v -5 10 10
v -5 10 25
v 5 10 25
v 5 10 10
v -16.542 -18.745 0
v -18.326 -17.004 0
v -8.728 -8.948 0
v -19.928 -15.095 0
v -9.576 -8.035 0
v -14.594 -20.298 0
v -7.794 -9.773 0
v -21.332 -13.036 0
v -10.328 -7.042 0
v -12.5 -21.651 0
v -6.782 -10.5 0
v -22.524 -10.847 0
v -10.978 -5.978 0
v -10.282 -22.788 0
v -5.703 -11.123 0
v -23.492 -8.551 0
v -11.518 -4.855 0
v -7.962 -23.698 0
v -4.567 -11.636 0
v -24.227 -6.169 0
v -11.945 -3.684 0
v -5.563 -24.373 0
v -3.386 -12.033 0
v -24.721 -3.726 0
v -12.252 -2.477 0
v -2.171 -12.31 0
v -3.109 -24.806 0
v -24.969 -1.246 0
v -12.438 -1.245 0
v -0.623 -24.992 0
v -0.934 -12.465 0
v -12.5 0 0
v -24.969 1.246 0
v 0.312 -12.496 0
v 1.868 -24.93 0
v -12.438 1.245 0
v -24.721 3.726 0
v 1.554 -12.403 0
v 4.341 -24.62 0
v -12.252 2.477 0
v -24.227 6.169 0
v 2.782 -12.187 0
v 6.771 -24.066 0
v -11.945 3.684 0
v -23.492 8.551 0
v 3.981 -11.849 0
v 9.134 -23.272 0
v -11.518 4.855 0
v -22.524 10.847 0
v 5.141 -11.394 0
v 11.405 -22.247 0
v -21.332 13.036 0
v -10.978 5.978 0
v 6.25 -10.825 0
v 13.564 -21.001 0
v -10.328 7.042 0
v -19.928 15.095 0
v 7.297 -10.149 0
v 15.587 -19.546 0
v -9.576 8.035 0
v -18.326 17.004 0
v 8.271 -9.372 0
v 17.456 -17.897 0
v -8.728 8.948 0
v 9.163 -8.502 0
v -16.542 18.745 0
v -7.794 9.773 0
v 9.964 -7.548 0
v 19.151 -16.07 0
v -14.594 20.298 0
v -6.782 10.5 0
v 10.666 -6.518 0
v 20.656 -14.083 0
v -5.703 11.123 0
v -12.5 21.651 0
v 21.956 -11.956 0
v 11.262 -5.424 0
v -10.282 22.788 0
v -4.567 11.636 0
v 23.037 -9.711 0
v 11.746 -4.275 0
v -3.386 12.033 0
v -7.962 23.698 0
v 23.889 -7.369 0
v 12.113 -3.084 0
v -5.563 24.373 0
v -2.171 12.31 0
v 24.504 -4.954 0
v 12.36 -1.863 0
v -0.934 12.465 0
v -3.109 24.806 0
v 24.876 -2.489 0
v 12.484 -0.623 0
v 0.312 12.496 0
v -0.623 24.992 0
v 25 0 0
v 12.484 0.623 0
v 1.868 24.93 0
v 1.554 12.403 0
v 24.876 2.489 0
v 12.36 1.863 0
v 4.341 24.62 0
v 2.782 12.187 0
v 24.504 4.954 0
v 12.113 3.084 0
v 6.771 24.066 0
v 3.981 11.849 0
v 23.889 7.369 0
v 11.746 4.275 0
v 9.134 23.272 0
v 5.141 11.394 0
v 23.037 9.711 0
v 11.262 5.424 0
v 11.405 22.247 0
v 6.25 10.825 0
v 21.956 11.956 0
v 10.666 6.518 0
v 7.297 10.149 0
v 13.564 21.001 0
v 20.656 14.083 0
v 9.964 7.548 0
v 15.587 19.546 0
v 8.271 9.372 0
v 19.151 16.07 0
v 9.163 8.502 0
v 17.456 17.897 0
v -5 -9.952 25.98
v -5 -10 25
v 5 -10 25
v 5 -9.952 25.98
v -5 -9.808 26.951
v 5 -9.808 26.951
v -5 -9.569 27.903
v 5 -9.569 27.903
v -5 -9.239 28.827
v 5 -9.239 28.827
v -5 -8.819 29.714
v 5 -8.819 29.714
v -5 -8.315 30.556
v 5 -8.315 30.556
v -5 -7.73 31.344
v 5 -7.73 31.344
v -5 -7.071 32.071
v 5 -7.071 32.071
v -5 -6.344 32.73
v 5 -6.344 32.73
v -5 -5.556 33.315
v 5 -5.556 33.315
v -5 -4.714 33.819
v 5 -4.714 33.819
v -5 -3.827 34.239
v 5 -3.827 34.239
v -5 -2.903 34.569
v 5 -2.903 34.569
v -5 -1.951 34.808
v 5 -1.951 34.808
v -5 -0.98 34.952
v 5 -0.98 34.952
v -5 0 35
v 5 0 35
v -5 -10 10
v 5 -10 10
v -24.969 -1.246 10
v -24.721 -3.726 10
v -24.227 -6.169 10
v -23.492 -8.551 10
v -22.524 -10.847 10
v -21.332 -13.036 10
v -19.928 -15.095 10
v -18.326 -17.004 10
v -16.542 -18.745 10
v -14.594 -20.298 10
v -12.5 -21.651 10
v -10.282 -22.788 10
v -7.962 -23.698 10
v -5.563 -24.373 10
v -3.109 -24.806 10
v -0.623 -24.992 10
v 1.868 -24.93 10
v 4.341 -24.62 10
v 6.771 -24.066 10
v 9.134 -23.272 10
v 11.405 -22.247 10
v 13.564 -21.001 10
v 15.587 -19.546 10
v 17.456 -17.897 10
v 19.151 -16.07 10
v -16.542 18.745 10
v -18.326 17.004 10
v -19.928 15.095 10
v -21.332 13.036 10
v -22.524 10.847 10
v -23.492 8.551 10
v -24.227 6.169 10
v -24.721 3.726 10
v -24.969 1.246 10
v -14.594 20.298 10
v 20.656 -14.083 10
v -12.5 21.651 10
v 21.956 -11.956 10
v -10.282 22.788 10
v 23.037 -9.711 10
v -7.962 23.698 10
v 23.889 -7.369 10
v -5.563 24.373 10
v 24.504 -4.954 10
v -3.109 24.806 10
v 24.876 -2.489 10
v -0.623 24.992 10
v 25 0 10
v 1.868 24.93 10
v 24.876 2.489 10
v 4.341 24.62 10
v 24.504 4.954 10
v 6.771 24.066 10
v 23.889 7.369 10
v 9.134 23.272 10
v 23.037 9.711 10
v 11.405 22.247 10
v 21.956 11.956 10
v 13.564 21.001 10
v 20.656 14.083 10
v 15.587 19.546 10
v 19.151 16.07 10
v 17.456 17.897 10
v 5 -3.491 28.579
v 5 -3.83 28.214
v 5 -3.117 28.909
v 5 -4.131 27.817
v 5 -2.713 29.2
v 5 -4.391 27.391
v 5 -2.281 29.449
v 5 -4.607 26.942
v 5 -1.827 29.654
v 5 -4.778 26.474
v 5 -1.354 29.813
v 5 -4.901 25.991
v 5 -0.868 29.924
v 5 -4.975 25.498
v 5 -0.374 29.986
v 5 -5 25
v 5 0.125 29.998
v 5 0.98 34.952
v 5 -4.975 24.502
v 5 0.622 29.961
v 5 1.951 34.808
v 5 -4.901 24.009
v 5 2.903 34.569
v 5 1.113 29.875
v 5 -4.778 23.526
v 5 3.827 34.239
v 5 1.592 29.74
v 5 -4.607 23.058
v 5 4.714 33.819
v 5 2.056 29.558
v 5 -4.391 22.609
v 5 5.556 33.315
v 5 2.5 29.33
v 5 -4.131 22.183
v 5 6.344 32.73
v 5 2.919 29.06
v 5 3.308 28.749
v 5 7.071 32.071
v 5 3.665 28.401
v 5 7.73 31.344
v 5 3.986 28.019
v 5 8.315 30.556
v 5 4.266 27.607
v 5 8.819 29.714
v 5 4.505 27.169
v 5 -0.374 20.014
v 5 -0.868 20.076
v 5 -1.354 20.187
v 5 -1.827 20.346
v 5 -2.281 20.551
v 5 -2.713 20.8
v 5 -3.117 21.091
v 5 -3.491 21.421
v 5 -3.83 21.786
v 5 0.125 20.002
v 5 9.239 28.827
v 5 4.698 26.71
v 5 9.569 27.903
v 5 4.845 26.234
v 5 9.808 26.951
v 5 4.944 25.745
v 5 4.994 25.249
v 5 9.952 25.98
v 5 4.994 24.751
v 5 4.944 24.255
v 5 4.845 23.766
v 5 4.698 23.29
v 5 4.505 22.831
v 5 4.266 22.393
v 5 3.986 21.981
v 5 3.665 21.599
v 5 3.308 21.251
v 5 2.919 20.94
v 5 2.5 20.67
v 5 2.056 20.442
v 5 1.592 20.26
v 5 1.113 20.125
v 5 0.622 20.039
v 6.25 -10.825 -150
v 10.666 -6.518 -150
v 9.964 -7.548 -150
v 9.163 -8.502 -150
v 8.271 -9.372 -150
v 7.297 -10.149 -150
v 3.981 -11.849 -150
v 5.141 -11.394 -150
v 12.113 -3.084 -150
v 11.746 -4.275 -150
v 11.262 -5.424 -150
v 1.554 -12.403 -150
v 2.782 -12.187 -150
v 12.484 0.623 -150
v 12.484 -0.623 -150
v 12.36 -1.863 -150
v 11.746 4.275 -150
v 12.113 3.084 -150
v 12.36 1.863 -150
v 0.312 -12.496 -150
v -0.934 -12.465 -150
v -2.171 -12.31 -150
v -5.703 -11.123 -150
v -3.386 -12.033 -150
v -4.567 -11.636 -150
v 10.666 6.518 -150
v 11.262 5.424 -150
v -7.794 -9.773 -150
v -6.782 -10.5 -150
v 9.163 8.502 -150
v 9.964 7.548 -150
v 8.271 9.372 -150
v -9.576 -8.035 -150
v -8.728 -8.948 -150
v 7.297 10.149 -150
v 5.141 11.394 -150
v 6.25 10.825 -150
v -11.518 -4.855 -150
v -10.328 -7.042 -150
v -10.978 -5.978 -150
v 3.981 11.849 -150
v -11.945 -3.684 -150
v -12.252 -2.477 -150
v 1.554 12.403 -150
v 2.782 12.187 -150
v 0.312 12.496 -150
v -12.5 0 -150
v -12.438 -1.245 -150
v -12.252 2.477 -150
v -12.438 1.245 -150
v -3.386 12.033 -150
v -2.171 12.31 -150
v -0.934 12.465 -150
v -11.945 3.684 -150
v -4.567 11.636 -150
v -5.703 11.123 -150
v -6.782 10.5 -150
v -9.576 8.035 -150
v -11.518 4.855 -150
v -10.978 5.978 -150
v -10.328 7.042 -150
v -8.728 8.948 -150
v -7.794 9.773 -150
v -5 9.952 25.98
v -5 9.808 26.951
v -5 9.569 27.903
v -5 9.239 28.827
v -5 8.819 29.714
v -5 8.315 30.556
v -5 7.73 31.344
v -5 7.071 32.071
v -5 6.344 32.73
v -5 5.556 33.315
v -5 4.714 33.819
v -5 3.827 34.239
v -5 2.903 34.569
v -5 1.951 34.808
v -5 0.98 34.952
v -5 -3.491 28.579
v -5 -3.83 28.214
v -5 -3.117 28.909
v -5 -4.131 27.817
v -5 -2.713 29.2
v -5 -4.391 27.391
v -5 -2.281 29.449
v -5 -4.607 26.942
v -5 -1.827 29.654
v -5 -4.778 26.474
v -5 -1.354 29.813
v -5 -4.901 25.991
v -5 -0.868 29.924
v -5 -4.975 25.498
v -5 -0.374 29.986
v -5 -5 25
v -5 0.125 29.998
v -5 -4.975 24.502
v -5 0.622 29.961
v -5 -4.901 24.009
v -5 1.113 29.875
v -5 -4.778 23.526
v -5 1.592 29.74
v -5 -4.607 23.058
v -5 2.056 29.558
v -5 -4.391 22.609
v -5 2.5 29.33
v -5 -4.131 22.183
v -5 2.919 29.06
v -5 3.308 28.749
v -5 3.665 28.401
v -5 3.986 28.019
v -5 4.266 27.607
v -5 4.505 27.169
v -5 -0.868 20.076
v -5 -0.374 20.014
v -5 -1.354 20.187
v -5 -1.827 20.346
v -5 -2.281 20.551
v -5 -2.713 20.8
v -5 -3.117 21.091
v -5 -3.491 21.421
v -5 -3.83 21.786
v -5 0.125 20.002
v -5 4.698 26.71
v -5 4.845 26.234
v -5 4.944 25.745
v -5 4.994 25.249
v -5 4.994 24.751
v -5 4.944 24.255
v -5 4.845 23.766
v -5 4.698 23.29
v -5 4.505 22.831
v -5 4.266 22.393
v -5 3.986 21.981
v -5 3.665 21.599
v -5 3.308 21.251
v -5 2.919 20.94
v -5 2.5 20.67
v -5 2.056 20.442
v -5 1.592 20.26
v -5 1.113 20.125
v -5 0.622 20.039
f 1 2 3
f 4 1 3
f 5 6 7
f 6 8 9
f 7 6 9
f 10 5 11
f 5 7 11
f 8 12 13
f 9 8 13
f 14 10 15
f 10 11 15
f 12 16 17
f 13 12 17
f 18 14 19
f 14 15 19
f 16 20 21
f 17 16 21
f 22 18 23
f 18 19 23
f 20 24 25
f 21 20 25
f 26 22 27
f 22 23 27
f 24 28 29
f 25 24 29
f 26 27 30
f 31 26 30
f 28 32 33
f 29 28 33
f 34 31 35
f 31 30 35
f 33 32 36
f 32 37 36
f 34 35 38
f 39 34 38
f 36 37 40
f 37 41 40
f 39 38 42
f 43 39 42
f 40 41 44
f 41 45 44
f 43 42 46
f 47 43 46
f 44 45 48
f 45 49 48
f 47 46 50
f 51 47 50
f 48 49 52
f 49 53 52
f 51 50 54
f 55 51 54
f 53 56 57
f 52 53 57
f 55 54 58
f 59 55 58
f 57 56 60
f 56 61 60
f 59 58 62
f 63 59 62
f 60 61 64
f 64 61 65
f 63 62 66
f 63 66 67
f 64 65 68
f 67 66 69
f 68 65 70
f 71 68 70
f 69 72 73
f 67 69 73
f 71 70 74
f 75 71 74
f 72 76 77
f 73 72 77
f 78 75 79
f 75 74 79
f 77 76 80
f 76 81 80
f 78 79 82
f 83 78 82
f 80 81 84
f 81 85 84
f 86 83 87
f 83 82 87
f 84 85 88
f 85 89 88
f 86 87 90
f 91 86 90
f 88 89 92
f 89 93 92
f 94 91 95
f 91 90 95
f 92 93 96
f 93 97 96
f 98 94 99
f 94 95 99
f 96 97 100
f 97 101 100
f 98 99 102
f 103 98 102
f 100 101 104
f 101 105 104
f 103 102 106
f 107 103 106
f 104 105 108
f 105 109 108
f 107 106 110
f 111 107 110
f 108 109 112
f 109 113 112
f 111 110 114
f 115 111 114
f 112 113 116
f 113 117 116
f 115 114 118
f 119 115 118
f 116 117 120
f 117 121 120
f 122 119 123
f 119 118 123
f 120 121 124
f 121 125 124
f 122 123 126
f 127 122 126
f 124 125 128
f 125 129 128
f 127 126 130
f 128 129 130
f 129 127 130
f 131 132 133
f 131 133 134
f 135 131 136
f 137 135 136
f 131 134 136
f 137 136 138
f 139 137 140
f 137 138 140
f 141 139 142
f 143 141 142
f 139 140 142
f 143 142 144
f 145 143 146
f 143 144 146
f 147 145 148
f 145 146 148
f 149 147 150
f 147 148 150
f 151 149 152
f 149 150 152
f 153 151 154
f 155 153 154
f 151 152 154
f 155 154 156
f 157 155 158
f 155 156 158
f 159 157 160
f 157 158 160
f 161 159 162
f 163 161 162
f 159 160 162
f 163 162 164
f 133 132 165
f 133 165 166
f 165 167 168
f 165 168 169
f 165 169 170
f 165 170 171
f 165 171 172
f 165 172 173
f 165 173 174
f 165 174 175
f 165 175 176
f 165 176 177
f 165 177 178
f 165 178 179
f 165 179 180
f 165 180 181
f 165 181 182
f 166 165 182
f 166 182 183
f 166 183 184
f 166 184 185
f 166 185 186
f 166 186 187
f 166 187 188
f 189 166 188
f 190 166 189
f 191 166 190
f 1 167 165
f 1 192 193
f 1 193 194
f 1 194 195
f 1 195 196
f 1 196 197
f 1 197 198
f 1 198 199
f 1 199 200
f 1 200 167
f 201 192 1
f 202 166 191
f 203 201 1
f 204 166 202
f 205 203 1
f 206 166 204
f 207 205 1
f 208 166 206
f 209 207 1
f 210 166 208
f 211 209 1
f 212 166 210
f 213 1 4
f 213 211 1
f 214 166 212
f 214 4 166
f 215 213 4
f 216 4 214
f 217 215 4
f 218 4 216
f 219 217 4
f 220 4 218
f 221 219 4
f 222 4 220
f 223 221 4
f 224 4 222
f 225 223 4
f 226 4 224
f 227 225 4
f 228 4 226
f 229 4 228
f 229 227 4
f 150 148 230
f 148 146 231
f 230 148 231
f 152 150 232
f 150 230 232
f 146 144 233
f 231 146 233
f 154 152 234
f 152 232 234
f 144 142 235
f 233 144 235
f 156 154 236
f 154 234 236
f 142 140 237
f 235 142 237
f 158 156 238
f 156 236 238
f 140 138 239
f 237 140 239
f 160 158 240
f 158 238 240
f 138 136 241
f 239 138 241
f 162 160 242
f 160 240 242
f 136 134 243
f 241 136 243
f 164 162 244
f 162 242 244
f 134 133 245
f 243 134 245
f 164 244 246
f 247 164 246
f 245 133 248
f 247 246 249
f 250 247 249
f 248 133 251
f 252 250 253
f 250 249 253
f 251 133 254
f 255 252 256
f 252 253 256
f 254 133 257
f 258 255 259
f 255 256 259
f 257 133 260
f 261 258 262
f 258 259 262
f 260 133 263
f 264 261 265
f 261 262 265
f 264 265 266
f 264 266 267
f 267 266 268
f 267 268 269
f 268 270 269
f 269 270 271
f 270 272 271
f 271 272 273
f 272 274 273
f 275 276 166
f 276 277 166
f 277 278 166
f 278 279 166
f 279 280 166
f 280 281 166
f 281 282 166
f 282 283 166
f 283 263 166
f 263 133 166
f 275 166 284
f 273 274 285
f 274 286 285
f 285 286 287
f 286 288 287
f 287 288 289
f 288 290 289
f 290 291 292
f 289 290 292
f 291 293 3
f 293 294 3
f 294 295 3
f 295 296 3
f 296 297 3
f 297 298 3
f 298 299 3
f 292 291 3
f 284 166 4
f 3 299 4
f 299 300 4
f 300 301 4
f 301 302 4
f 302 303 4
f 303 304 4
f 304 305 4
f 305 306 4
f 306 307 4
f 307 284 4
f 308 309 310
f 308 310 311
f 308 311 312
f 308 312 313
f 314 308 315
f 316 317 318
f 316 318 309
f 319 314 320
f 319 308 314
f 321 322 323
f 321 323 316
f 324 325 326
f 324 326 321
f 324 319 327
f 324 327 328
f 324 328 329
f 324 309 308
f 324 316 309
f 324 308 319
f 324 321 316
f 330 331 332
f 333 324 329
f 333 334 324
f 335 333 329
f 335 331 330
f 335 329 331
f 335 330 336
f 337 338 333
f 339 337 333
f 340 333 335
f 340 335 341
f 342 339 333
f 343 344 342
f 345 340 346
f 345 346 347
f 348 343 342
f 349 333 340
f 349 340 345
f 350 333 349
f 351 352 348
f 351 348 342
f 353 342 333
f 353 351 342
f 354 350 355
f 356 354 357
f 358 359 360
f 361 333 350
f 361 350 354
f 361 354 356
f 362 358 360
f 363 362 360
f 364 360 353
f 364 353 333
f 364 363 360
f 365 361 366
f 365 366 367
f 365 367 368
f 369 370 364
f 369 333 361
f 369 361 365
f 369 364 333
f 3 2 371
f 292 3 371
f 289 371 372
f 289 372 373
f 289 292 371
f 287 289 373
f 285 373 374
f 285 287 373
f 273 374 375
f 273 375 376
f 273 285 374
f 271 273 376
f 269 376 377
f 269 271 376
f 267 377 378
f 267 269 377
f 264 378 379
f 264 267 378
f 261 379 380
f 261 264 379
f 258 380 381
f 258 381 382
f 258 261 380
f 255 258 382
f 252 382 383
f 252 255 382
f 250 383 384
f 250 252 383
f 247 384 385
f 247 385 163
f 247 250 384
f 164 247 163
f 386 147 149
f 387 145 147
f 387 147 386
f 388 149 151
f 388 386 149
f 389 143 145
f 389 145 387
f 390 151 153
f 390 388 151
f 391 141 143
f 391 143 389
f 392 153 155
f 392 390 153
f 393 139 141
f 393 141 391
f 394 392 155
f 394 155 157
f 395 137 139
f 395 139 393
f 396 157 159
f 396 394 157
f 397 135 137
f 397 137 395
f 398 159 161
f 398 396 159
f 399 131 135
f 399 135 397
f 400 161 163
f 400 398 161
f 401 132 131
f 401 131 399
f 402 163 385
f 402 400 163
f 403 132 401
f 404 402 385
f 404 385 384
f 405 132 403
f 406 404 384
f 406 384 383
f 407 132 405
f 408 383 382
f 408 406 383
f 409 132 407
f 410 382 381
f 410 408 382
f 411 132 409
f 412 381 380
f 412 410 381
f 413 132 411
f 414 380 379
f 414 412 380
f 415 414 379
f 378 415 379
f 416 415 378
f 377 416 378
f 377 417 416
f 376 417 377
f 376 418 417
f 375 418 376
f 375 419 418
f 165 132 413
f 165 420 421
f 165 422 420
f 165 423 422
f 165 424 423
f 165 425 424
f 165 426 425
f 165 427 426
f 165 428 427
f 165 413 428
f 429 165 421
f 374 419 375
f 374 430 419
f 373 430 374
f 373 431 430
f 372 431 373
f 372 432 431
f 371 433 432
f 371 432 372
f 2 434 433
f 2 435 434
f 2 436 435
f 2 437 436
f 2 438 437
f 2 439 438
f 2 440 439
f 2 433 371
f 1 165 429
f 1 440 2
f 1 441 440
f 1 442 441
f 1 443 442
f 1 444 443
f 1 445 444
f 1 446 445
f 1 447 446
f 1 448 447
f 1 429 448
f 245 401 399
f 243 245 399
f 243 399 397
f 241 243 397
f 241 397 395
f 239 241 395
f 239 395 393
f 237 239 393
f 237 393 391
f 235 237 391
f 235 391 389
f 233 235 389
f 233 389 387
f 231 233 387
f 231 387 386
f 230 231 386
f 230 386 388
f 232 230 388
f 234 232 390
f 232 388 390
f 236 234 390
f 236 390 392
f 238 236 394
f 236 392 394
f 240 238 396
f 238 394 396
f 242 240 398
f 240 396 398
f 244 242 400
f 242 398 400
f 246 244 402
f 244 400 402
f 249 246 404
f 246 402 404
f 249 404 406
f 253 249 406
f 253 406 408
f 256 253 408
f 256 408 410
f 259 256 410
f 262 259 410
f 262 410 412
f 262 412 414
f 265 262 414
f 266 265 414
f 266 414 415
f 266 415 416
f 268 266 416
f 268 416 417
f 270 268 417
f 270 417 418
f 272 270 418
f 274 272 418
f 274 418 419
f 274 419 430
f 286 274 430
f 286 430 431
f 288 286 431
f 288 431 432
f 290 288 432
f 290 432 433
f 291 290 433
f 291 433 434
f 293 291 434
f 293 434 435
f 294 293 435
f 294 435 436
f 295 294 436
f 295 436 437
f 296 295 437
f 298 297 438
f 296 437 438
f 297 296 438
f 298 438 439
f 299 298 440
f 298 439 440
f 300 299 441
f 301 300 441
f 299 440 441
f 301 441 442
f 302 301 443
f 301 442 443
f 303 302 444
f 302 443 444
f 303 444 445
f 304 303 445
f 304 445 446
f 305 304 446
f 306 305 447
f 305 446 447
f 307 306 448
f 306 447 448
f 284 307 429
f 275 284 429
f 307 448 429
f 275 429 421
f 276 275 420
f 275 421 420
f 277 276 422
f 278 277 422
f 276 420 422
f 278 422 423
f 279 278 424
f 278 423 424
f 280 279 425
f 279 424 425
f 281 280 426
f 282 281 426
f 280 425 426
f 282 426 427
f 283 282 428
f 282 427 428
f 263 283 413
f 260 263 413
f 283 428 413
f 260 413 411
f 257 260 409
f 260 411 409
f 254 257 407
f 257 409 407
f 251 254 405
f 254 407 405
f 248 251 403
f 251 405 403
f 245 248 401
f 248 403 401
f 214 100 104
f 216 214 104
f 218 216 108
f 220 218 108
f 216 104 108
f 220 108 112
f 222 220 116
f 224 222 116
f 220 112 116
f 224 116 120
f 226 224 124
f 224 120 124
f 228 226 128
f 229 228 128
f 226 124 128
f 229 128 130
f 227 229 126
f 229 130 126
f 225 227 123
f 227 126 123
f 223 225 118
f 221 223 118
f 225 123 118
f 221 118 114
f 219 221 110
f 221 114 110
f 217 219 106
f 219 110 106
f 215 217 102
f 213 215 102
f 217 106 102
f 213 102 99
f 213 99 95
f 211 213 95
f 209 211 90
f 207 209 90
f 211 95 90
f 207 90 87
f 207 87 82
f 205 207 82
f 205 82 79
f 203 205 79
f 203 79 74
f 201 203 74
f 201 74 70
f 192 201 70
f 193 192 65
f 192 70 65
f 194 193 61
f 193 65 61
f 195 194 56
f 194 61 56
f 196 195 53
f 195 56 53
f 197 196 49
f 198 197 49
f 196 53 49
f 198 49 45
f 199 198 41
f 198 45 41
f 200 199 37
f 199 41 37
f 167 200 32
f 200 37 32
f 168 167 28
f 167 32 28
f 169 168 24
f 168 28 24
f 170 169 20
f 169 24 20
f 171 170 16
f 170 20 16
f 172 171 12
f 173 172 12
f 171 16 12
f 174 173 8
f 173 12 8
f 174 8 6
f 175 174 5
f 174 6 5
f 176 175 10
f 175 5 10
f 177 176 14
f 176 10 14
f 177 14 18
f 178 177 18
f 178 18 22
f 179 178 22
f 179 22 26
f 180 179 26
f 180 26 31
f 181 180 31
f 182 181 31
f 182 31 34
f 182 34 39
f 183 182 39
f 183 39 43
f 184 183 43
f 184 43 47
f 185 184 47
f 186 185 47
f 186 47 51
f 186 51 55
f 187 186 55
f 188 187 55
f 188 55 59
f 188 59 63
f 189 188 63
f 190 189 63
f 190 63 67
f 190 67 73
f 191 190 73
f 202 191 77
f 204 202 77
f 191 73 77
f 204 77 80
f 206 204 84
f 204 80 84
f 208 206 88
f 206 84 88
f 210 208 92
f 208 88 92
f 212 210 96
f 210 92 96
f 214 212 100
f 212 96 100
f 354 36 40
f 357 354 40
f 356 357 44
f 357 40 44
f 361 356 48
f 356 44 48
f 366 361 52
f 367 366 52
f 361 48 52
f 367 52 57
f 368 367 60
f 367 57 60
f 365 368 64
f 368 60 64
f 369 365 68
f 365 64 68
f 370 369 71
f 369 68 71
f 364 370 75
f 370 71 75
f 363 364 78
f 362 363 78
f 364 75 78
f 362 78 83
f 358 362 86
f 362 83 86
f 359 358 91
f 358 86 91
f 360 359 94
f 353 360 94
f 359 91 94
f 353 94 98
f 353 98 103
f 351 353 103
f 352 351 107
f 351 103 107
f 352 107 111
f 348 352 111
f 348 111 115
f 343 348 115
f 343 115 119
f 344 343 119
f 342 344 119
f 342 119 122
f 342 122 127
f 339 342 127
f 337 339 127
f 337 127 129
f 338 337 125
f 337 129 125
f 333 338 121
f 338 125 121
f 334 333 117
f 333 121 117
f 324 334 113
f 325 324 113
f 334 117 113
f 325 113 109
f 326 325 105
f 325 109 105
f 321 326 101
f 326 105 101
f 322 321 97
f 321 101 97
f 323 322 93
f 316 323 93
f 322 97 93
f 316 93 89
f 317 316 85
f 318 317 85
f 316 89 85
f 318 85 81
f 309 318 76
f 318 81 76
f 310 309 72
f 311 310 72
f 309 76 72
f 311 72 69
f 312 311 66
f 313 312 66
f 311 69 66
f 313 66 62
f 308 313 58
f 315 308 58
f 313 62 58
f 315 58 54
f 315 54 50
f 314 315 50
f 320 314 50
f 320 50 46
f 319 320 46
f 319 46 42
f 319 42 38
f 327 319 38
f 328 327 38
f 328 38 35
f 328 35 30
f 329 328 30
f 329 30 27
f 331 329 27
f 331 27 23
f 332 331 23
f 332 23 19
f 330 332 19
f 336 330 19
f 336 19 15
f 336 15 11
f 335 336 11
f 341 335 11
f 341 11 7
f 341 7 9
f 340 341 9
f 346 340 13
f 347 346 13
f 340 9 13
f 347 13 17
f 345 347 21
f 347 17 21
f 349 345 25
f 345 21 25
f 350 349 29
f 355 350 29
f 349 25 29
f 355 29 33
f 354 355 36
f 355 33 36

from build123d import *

# Parameters (mm, degrees)
SKETCH2_R           = 25
BOSS_EXTRUDE2_DEPTH = 10
SKETCH3_W           = 10
SKETCH3_H           = 20
BOSS_EXTRUDE3_DEPTH = 25
SKETCH4_R           = 5
CUT_EXTRUDE1_DEPTH  = 20
FILLET1_R           = 10
SKETCH5_R           = 12.5
BOSS_EXTRUDE4_DEPTH = 150


with BuildPart() as part:
    # Sketch2 → Boss-Extrude2 (new body)
    with BuildSketch(Plane.XY):
        Circle(SKETCH2_R)
    extrude(amount=BOSS_EXTRUDE2_DEPTH)

    # Sketch3 → Boss-Extrude3 (add)
    with BuildSketch(Plane.XY.offset(10)):
        Rectangle(SKETCH3_W, SKETCH3_H)
    extrude(amount=BOSS_EXTRUDE3_DEPTH)

    # Sketch4 → Cut-Extrude1 (cut)
    with BuildSketch(Plane.ZY.offset(5)):
        with Locations(Location((25, 0, 0), (0, 0, 270))):
            Circle(SKETCH4_R)
    extrude(amount=-CUT_EXTRUDE1_DEPTH, mode=Mode.SUBTRACT)

    # Fillet1
    fillet1_edges = [part.edges().sort_by_distance(p)[0] for p in [
        (0, -10, 35),
        (0, 10, 35),
    ]]
    fillet(fillet1_edges, radius=FILLET1_R - 0.0001)  # a hair under: the kernel refuses the full size

    # Sketch5 → Boss-Extrude4 (add)
    with BuildSketch(Plane(origin=(0, 0, 0), x_dir=(-1, 0, 0), z_dir=(0, 0, -1))):
        Circle(SKETCH5_R)
    extrude(amount=BOSS_EXTRUDE4_DEPTH)


solid = part.part
